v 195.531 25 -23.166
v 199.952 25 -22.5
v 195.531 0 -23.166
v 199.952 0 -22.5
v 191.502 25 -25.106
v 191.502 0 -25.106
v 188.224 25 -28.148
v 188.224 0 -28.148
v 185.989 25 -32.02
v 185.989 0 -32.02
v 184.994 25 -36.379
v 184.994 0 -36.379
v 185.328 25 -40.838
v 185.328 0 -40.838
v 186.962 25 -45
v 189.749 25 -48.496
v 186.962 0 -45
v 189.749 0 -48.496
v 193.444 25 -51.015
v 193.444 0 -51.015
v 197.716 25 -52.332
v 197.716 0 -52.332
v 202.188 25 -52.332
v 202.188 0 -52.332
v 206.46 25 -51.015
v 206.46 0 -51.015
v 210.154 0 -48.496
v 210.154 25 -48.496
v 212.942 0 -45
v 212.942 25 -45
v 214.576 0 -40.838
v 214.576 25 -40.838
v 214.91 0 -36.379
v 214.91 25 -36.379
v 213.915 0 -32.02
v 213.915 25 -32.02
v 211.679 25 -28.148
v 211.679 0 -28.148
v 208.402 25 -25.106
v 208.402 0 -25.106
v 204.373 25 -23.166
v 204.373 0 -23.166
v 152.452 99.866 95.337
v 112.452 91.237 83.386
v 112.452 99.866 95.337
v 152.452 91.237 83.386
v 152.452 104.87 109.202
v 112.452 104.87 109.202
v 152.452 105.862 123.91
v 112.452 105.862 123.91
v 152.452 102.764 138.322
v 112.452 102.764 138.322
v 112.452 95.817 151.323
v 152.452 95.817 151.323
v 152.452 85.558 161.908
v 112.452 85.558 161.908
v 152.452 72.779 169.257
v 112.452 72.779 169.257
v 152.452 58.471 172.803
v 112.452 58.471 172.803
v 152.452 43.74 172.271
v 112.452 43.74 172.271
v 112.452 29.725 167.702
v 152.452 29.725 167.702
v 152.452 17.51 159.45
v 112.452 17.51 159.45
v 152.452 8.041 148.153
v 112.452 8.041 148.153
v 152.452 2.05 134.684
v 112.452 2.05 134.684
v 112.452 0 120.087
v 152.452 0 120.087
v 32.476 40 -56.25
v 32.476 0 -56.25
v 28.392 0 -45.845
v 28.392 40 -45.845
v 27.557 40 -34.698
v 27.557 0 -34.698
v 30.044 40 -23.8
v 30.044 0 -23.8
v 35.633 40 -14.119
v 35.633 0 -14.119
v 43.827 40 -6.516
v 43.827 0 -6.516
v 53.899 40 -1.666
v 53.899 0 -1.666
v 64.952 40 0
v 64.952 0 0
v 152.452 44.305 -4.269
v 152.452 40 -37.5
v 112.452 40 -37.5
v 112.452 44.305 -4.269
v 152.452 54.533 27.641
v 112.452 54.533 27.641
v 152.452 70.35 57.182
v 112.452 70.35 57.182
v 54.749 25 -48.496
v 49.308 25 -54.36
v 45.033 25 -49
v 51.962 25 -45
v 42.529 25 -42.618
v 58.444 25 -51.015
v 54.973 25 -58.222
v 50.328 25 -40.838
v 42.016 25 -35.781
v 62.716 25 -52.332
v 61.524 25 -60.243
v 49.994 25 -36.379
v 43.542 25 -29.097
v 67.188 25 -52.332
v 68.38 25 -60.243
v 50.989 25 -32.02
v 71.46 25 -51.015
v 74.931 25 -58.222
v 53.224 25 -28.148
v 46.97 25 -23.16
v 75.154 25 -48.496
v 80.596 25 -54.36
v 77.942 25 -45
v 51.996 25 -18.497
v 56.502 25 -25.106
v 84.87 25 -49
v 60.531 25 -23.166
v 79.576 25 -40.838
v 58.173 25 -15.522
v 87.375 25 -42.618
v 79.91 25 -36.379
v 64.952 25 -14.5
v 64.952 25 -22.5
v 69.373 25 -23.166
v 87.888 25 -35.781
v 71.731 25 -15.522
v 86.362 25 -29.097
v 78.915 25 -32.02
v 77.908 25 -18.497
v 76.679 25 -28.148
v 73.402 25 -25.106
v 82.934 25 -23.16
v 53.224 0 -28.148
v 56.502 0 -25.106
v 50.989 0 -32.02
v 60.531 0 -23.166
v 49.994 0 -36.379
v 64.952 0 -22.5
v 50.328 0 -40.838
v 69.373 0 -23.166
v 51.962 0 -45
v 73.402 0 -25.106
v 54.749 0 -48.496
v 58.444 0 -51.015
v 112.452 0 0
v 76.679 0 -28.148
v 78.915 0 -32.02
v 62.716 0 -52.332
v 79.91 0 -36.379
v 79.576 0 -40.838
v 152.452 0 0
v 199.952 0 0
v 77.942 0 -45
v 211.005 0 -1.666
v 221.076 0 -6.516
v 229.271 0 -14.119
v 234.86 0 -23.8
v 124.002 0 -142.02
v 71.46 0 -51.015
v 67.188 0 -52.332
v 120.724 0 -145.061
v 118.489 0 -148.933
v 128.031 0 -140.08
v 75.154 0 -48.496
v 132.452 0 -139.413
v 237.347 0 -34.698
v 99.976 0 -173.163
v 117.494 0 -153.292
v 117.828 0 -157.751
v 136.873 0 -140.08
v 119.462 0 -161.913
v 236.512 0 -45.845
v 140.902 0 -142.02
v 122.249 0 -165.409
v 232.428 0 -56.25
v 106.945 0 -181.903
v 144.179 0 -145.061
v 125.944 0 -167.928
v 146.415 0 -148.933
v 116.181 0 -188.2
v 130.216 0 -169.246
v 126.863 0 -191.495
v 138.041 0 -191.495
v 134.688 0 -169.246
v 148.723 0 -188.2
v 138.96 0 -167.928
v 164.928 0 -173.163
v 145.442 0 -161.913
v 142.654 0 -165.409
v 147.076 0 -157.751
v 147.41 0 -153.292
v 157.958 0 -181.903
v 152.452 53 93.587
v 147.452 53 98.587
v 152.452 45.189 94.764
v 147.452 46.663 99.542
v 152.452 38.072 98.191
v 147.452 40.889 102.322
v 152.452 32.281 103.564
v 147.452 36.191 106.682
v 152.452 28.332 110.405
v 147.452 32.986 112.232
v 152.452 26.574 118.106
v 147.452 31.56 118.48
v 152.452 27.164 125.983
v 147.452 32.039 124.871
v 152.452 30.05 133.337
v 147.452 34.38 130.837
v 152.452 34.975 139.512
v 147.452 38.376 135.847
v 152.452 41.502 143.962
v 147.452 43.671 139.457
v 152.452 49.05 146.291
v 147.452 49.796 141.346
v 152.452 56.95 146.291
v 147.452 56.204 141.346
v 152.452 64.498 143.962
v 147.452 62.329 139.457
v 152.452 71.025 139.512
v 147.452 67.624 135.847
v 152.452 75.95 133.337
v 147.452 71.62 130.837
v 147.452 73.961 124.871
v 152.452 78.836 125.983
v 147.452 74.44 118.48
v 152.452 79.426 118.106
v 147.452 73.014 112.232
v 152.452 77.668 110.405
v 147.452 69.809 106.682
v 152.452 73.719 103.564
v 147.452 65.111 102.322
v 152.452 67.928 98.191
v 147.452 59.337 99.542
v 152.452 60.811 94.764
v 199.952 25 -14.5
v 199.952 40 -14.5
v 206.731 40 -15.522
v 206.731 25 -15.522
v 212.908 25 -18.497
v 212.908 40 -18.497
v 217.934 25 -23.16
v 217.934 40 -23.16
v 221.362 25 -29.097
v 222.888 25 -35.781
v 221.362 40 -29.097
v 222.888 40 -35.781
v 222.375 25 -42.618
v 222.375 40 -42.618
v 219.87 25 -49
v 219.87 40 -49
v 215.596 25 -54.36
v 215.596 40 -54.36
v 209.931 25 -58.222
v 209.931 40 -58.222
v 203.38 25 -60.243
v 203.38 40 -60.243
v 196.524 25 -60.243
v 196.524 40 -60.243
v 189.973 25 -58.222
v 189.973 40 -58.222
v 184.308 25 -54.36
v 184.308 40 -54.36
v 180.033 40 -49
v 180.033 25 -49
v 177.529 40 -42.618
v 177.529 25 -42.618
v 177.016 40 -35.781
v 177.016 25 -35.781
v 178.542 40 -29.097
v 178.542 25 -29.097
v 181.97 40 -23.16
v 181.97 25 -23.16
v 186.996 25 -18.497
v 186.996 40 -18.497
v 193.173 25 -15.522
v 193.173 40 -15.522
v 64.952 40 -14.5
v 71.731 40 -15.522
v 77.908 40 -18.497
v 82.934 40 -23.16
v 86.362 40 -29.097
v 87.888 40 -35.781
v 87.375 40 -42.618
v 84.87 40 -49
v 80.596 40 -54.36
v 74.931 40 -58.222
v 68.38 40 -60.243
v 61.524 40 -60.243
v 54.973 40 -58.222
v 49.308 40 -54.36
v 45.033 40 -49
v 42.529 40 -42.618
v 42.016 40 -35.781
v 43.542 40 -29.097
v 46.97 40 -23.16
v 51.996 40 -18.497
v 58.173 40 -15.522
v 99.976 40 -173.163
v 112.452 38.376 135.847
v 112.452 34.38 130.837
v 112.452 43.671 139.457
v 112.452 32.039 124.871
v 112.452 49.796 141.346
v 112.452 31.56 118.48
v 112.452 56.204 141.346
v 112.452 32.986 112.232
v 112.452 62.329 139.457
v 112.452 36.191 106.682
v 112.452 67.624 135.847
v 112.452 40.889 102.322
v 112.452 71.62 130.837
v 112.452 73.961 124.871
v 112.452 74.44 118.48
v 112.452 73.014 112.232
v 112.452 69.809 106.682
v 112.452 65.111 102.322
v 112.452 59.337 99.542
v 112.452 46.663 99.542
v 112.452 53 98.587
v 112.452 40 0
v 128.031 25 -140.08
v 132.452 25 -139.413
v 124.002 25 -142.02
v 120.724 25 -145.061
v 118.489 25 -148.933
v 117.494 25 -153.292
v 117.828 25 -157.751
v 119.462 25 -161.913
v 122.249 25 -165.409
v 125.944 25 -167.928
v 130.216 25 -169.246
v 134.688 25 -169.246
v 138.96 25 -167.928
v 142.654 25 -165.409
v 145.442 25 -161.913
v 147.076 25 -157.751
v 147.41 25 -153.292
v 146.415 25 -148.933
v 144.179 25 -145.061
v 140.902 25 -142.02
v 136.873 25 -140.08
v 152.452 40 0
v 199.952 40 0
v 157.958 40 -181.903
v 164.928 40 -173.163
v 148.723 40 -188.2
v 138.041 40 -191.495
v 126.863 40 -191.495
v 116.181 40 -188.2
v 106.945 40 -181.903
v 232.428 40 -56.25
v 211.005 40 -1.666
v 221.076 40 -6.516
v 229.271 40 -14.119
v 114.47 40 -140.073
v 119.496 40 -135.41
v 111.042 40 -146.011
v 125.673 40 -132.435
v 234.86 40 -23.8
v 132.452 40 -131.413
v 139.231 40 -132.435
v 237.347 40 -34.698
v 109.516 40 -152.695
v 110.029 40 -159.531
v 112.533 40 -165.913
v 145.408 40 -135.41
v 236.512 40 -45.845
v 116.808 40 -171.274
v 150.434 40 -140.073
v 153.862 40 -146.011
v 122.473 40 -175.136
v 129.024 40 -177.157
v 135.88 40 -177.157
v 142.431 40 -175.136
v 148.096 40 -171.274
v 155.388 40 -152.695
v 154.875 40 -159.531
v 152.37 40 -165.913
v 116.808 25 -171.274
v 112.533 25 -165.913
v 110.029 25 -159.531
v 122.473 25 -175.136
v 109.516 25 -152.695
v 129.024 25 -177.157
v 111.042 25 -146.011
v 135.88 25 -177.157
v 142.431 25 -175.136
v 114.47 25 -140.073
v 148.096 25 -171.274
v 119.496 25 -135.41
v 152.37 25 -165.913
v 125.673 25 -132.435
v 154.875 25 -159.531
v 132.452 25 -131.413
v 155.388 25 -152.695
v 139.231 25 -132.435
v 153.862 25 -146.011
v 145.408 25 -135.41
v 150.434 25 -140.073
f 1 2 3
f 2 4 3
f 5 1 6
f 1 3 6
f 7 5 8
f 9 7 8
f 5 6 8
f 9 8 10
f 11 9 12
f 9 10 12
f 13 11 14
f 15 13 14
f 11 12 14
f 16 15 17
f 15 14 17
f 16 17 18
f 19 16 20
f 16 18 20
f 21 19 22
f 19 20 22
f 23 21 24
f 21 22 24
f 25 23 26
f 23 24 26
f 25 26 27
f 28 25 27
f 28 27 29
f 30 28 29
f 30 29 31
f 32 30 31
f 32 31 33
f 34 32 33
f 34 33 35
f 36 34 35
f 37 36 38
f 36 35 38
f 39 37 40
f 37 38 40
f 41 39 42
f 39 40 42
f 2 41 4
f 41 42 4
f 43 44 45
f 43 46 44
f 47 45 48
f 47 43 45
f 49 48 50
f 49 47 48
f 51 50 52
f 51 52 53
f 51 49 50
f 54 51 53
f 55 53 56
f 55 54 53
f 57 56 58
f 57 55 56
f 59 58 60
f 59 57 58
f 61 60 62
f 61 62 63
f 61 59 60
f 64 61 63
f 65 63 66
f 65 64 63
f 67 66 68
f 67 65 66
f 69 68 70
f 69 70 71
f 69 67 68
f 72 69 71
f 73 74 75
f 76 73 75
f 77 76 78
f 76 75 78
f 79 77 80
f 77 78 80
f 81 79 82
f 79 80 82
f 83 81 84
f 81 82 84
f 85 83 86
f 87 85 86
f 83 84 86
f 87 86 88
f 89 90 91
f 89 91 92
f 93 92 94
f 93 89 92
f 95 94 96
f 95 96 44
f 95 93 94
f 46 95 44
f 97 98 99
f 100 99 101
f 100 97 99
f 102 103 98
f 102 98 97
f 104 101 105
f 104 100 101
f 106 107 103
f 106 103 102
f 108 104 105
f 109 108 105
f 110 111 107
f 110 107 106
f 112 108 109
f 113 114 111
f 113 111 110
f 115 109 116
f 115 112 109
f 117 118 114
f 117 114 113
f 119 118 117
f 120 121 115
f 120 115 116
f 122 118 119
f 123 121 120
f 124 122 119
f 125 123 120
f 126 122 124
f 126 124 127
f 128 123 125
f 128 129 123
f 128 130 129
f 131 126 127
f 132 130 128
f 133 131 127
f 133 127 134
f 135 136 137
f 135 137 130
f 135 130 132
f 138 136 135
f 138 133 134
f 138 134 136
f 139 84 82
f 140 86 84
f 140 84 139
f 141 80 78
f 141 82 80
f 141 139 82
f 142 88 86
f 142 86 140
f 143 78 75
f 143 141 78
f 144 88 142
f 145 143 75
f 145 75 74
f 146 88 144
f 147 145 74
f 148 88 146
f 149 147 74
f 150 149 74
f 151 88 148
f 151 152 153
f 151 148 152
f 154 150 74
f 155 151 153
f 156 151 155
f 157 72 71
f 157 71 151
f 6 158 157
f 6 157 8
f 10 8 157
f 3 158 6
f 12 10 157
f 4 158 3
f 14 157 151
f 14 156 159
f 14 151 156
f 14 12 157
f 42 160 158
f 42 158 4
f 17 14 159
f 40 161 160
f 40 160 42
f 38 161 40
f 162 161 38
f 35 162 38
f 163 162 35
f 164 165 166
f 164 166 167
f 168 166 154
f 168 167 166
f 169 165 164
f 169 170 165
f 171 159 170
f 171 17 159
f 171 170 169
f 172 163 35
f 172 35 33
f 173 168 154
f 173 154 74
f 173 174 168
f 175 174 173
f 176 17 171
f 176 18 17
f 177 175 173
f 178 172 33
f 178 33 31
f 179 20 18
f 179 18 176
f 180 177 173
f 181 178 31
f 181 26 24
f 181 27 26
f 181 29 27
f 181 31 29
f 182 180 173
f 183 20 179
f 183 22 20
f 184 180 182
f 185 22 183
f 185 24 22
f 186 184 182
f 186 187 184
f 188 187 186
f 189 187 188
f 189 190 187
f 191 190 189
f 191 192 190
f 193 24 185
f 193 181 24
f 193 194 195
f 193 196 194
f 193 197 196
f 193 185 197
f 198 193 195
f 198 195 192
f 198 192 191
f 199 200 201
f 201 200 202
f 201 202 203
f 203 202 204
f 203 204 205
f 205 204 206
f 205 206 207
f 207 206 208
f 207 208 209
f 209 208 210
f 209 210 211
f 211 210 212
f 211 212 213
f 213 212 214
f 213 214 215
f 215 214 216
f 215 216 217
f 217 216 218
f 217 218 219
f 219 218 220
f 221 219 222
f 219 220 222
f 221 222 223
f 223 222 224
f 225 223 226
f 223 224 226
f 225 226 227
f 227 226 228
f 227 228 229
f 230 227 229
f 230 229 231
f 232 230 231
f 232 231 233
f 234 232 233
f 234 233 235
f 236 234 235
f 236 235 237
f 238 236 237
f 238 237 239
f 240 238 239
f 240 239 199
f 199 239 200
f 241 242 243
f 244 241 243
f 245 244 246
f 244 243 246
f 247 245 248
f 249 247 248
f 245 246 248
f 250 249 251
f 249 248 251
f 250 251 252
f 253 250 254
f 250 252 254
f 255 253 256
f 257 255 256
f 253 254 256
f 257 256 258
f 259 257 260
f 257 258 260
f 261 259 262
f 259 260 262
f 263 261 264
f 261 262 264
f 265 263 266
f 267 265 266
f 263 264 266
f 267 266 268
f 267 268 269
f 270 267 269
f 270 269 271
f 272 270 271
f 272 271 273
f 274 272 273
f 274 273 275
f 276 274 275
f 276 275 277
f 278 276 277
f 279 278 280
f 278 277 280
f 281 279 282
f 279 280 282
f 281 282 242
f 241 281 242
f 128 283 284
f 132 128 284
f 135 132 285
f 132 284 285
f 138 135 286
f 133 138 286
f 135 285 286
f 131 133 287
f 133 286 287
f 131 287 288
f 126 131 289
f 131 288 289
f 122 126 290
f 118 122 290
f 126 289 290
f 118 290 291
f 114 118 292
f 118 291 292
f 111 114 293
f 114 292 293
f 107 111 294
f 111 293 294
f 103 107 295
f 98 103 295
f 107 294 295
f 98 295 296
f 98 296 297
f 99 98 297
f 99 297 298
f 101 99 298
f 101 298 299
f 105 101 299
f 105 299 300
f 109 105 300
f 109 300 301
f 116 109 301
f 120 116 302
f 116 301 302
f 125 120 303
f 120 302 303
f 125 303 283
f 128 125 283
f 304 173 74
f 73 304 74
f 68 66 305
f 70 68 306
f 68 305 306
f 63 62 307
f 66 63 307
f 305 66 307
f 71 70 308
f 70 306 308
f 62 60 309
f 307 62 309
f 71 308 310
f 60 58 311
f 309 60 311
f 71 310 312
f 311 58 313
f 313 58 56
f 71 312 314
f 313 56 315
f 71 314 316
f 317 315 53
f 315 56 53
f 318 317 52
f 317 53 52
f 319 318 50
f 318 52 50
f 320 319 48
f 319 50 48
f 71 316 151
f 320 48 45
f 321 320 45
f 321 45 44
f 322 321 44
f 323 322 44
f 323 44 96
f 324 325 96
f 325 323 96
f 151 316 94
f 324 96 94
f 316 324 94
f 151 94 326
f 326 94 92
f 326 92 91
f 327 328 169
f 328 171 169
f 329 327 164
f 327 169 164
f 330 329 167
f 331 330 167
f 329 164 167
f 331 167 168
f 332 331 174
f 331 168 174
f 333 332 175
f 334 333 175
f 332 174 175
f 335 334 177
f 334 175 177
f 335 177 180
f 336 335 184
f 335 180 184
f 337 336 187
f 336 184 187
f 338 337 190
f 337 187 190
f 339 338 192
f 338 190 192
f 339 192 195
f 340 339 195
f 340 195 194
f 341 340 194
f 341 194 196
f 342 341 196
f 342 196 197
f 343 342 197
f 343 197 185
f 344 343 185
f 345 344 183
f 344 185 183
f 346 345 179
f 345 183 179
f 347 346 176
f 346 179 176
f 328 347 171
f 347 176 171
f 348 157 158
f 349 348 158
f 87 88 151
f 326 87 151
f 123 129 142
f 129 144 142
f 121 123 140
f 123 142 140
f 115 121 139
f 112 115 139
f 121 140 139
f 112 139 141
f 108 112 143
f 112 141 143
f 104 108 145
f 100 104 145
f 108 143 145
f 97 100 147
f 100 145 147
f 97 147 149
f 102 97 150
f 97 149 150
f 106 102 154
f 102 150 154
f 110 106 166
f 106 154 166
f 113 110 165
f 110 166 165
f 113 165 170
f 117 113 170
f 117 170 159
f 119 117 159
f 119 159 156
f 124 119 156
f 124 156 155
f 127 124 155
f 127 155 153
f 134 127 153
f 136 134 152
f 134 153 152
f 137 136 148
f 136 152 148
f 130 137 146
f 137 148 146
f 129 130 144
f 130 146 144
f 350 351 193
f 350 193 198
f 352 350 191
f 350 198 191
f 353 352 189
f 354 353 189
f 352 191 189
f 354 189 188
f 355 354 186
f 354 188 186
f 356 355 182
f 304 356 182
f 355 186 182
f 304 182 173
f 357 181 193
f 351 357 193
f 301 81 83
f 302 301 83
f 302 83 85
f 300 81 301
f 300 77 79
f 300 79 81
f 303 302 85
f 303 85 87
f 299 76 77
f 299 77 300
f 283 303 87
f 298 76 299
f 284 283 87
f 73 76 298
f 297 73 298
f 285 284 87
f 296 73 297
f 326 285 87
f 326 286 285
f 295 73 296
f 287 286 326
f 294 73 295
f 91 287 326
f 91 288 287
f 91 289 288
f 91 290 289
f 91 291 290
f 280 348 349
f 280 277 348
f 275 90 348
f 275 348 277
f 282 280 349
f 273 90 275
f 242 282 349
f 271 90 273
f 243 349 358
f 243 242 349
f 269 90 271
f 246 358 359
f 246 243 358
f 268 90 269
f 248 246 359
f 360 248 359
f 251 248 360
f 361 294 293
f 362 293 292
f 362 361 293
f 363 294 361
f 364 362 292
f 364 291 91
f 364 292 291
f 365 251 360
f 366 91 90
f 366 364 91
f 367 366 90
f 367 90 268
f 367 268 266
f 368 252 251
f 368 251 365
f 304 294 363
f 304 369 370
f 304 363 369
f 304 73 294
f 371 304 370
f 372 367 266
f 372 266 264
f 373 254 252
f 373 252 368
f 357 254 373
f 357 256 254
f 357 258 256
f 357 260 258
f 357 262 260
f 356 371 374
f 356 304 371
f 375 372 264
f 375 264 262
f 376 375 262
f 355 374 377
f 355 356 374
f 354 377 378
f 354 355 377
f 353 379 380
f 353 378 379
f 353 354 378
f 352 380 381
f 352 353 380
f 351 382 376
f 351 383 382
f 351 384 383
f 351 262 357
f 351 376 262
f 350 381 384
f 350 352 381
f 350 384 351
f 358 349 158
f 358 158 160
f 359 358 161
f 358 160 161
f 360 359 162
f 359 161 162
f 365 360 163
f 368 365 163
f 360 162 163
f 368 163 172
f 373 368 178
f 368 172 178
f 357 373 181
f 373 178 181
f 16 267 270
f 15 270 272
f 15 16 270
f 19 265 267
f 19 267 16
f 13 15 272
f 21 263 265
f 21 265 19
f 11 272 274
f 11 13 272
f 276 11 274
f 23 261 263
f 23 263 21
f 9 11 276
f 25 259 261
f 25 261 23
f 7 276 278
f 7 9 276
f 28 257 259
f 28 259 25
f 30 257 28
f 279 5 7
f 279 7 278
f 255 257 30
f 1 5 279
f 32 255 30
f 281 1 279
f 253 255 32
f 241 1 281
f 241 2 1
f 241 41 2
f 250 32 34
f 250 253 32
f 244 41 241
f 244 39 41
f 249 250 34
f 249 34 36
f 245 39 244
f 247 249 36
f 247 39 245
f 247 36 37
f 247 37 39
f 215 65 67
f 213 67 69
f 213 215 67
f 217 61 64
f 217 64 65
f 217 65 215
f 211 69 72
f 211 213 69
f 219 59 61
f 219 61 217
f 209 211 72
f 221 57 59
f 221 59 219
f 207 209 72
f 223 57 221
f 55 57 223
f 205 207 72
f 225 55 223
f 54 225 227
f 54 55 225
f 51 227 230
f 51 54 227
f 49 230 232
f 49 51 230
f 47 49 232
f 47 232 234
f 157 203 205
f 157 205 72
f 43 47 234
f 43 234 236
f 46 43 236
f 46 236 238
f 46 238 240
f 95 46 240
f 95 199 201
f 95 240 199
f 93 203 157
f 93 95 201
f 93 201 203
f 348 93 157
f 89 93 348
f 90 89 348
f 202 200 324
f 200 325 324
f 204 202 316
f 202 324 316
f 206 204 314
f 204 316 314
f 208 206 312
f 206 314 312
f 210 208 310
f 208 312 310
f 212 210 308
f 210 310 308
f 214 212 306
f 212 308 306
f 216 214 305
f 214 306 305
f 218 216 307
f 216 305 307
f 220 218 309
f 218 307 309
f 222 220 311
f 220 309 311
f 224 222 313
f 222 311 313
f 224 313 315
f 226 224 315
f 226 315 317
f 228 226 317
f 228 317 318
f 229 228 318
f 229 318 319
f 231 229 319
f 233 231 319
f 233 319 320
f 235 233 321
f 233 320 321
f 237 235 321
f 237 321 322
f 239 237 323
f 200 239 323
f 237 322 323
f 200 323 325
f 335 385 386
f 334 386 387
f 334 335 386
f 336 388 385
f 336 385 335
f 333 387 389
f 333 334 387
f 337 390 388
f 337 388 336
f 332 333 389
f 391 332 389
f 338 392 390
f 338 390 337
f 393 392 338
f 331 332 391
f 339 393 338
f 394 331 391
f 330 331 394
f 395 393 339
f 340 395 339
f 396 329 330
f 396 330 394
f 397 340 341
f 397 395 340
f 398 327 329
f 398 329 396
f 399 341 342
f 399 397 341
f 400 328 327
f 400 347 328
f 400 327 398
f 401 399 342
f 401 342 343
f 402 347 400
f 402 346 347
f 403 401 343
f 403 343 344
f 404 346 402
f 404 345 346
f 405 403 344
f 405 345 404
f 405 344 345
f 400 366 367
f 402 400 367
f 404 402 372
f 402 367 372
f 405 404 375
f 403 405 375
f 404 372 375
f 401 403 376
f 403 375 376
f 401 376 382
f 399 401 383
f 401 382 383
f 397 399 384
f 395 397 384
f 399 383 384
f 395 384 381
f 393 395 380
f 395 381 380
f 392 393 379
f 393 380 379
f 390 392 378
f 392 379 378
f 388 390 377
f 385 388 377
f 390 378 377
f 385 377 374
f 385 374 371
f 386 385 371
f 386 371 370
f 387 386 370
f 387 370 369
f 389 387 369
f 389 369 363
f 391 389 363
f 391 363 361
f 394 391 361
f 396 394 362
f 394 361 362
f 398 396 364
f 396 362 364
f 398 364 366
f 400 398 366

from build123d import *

# Parameters (mm, degrees)
BOSS_EXTRUDE1_DEPTH                             = 40
SKETCH4_R                                       = 23
CUT_EXTRUDE1_DEPTH                              = 15
BOSS_EXTRUDE3_DEPTH                             = 20
CSK_FOR_M2_OVAL_HEAD_MACHINE_SCREW1_D           = 43
CSK_FOR_M2_OVAL_HEAD_MACHINE_SCREW1_CSINK_D     = 53
CSK_FOR_M2_OVAL_HEAD_MACHINE_SCREW1_CSINK_ANGLE = 90
SKETCH18_W                                      = 15
SKETCH18_H                                      = 25
M2_CLEARANCE_HOLE1_AT_2_COUNT                   = 2
M2_CLEARANCE_HOLE1_AT_2_PITCH                   = 135
M2_CLEARANCE_HOLE1_AT_3_COUNT                   = 2
M2_CLEARANCE_HOLE1_AT_3_PITCH                   = 135


with BuildPart() as part:
    # Sketch1 → Boss-Extrude1 (new body)
    with BuildSketch(Plane(origin=(0, 0, 0), x_dir=(1, 0, 0), z_dir=(0, 1, 0))):
        with BuildLine():
            Line((64.951905284, 0), (199.951905284, 0))
            ThreePointArc((199.951905284, 0), (232.427857926, 18.75), (232.427857926, 56.25))
            Line((232.427857926, 56.25), (164.927857926, 173.163429511))
            ThreePointArc((164.927857926, 173.163429511), (132.451905284, 191.913429511), (99.975952642, 173.163429511))
            Line((99.975952642, 173.163429511), (32.475952642, 56.25))
            ThreePointArc((32.475952642, 56.25), (32.475952642, 18.75), (64.951905284, 0))
        make_face()
    extrude(amount=BOSS_EXTRUDE1_DEPTH)

    # Sketch4 → Cut-Extrude1 (cut)
    with BuildSketch(Plane(origin=(0, 40, 0), x_dir=(1, 0, 0), z_dir=(0, 1, 0))):
        with Locations(Location((64.951905284, 37.5, 0), (0, 0, 270))):
            Circle(SKETCH4_R)
        with Locations(Location((199.951905284, 37.5, 0), (0, 0, 270))):
            Circle(SKETCH4_R)
        with Locations(Location((132.451905284, 154.413429511, 0), (0, 0, 270))):
            Circle(SKETCH4_R)
    extrude(amount=-CUT_EXTRUDE1_DEPTH, mode=Mode.SUBTRACT)

    # Sketch16 → Boss-Extrude3 (add, symmetric)
    with BuildSketch(Plane(origin=(132.451905284, 0, 0), x_dir=(0, 0, -1), z_dir=(1, 0, 0))):
        with BuildLine():
            Line((-120.086570489, 0), (0, 0))
            Line((0, 0), (37.5, 0))
            Line((37.5, 0), (37.5, 40))
            ThreePointArc((37.5, 40), (-27.641071176, 54.533483722), (-83.385649061, 91.236662594))
            ThreePointArc((-83.385649061, 91.236662594), (-169.257411022, 72.779495475), (-120.086570489, 0))
        make_face()
    extrude(amount=BOSS_EXTRUDE3_DEPTH, both=True)

    # CSK for M2 Oval Head Machine Screw1 (through all)
    with Locations(Plane(origin=(152.451905284, 53, 120.086570489), x_dir=(0, 0, 1), z_dir=(1, 0, 0))):
        with Locations((0, 0)):
            CounterSinkHole(CSK_FOR_M2_OVAL_HEAD_MACHINE_SCREW1_D / 2, CSK_FOR_M2_OVAL_HEAD_MACHINE_SCREW1_CSINK_D / 2, counter_sink_angle=CSK_FOR_M2_OVAL_HEAD_MACHINE_SCREW1_CSINK_ANGLE)

    # Sketch18 → M2 Clearance Hole1 (revolve, cut)
    with BuildSketch(Plane(origin=(64.951905284, 25, -37.5), x_dir=(0, 0, 1), z_dir=(1, 0, 0))):
        with Locations((7.5, 12.5)):
            Rectangle(SKETCH18_W, SKETCH18_H)
    m2_clearance_hole1 = revolve(axis=Axis((64.951905284, 31.35, -37.5), (0, -1, 0)), mode=Mode.SUBTRACT)

    # M2 Clearance Hole1 at 2: M2 Clearance Hole1 ×2
    with Locations(*[(i * M2_CLEARANCE_HOLE1_AT_2_PITCH, 0, 0) for i in range(1, M2_CLEARANCE_HOLE1_AT_2_COUNT)]):
        add(m2_clearance_hole1, mode=Mode.SUBTRACT)

    # M2 Clearance Hole1 at 3: M2 Clearance Hole1 ×2
    with Locations(*[Vector(0.49999999999999206, 0, -0.8660254037844433) * (i * M2_CLEARANCE_HOLE1_AT_3_PITCH) for i in range(1, M2_CLEARANCE_HOLE1_AT_3_COUNT)]):
        add(m2_clearance_hole1, mode=Mode.SUBTRACT)


solid = part.part
